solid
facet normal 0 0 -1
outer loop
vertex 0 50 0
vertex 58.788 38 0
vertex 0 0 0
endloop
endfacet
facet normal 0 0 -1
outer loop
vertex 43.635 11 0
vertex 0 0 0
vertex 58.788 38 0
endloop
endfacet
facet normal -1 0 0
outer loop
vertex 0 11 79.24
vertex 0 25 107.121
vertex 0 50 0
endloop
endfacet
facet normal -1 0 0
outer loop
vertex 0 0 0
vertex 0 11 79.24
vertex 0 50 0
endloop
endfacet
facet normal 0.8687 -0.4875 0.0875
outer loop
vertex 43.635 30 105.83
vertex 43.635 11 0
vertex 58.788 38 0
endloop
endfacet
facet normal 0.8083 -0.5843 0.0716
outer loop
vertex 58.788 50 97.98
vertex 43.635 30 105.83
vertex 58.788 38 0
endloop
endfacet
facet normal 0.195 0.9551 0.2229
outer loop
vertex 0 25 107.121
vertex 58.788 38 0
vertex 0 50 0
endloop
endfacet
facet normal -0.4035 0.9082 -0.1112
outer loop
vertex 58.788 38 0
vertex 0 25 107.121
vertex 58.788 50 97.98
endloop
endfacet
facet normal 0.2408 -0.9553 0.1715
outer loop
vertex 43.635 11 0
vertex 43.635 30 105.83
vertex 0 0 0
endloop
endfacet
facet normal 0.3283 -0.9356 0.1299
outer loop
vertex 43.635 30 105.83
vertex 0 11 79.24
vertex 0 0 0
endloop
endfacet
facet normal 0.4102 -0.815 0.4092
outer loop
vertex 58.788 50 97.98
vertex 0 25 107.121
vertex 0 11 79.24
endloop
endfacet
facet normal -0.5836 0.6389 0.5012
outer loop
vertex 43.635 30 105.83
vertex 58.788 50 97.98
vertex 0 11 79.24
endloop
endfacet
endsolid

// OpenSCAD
// Create 8 Point Polyhedron given vertices and hypoteneuse lengths. This is mostly useful
// in reproducing physical things that are shaped like a box or a skewed box, Just measure the item 
// and plug in the values as shown. We assume that corner a is sitting at 0,0,0  but this can be tranformed to anywhere on the
// plane


//base polygon a is 0,0,0 and b is along y axis while c and d are anywhere in the x,y plane
// a --- b
//  \     \
//   d --- c
//back polygon has bottom along y axis
// e --- f
//  \     \
//   a --- b
//front polygon
// h --- g
//  \     \
//   d --- c
//left polygon
// e --- h
//  \     \
//   a --- d
//right polygon
// g --- f
//  \     \
//   c --- b
//top polygon
// e --- f
//  \     \
//   h --- g

a_b = 50;
a_d = 60;
a_h = 110;
a_e = 100;
a_f = 110;

b_c = 70;
b_d = 75;
b_e = 80;
b_f = 110;
b_g = 110;

c_a = 60;
c_g = 100;

//c_d = 30;
d_a = 45;
d_h = 110;

e_f = 50;
f_g = 60;
g_h = 70;
h_f = 70;

//a_f =
//for simplicity the base polygon is sitting on the z origin with corner a at 0,0,0
pt_a = [0, 0, 0];
pt_b = [0,a_b, 0]; 

//now we know that c is heightOfTriangle away from our base a_b 
//and with height of triangle and the length of c we can easily figure out the missing side of
//90 degree triangle along x axis
c_height = heightOfTriangle(a_b, b_c, c_a, a_b);
pt_c = [ c_height, pythagForBase(b_c, c_height), 0 ];

d_height = heightOfTriangle(a_b, b_d, d_a , a_b);
pt_d = [ d_height, pythagForBase(d_a, d_height), 0 ];
 
e_height = heightOfTriangle(a_b, b_e, a_e, a_b);
pt_e = [0, pythagForBase(b_e, e_height), e_height];

f_height = heightOfTriangle(a_b, a_f,b_f, a_b);
pt_f = [0, pythagForBase(a_f, f_height), f_height];

g_height = heightOfTriangle(b_g, b_c, c_g, b_c);
pt_g = [pt_c[0], pythagForBase(b_g, g_height) , g_height];

h_height = heightOfTriangle(a_d, d_h, a_h, a_d);
pt_h = [pt_d[0], pythagForBase(a_h, h_height), h_height];

//point vector for polyhedron function
points_for_eight_point_poly = [pt_a, pt_b, pt_c, pt_d, pt_e, pt_f, pt_g, pt_h];
polyhedron( 
  points    = points_for_eight_point_poly, 
  triangles = trianglesForEightPointPoly()
);

//this is a default set of triangles to create a basic 8 point polygon;
//parameters a to h are defined for convienience and should not need to be overidden
//TOOD: function local variables? ftw
function trianglesForEightPointPoly(a=0,b=1,c=2,d=3,e=4,f=5,g=6,h=7) = ([
    [a,c,b], [c,a,d], //bottom
    [b,f,e], [b,e,a], //back
    [c,d,h], [c,h,g], //front 
    [b,c,f], [g,f,c], //left
    [a,h,d], [a,e,h], //right
    [e,f,g], [e,g,h]  //top 
]);

// We can just use standard formula for area of triangle
// A = b/2 * H and solve for H
// 2A/b = H
function heightOfTriangle(x,y,z,b) = (2 * areaOfTriangleGivenSides(x,y,z)) / b; 

//calculate the area of the triangle given the sides (herons formula)
// A = 1/4 * Sqrt( a^2 + b^2 + c^2 - 2(a^4 + b^4 + c^4)
function areaOfTriangleGivenSides(x,y,z) =  (1/4) * sqrt( pow(poweredSum(x,y,z,2),2) - (2 * poweredSum(x,y,z,4))  );

//Sum three points, each raised to the given power before sum
function poweredSum(x,y,z,p) = pow(x,p) + pow(y,p) + pow(z,p);

//now we just need good old pythagoras to help us out 
// a^2 + b^2 = c^2
// but we are not missing c we are missing a
// a = sqrt( c^2 - b^2)  
function pythagForBase(hyp,height) = sqrt(pow(hyp,2) - pow(height,2)) ;
